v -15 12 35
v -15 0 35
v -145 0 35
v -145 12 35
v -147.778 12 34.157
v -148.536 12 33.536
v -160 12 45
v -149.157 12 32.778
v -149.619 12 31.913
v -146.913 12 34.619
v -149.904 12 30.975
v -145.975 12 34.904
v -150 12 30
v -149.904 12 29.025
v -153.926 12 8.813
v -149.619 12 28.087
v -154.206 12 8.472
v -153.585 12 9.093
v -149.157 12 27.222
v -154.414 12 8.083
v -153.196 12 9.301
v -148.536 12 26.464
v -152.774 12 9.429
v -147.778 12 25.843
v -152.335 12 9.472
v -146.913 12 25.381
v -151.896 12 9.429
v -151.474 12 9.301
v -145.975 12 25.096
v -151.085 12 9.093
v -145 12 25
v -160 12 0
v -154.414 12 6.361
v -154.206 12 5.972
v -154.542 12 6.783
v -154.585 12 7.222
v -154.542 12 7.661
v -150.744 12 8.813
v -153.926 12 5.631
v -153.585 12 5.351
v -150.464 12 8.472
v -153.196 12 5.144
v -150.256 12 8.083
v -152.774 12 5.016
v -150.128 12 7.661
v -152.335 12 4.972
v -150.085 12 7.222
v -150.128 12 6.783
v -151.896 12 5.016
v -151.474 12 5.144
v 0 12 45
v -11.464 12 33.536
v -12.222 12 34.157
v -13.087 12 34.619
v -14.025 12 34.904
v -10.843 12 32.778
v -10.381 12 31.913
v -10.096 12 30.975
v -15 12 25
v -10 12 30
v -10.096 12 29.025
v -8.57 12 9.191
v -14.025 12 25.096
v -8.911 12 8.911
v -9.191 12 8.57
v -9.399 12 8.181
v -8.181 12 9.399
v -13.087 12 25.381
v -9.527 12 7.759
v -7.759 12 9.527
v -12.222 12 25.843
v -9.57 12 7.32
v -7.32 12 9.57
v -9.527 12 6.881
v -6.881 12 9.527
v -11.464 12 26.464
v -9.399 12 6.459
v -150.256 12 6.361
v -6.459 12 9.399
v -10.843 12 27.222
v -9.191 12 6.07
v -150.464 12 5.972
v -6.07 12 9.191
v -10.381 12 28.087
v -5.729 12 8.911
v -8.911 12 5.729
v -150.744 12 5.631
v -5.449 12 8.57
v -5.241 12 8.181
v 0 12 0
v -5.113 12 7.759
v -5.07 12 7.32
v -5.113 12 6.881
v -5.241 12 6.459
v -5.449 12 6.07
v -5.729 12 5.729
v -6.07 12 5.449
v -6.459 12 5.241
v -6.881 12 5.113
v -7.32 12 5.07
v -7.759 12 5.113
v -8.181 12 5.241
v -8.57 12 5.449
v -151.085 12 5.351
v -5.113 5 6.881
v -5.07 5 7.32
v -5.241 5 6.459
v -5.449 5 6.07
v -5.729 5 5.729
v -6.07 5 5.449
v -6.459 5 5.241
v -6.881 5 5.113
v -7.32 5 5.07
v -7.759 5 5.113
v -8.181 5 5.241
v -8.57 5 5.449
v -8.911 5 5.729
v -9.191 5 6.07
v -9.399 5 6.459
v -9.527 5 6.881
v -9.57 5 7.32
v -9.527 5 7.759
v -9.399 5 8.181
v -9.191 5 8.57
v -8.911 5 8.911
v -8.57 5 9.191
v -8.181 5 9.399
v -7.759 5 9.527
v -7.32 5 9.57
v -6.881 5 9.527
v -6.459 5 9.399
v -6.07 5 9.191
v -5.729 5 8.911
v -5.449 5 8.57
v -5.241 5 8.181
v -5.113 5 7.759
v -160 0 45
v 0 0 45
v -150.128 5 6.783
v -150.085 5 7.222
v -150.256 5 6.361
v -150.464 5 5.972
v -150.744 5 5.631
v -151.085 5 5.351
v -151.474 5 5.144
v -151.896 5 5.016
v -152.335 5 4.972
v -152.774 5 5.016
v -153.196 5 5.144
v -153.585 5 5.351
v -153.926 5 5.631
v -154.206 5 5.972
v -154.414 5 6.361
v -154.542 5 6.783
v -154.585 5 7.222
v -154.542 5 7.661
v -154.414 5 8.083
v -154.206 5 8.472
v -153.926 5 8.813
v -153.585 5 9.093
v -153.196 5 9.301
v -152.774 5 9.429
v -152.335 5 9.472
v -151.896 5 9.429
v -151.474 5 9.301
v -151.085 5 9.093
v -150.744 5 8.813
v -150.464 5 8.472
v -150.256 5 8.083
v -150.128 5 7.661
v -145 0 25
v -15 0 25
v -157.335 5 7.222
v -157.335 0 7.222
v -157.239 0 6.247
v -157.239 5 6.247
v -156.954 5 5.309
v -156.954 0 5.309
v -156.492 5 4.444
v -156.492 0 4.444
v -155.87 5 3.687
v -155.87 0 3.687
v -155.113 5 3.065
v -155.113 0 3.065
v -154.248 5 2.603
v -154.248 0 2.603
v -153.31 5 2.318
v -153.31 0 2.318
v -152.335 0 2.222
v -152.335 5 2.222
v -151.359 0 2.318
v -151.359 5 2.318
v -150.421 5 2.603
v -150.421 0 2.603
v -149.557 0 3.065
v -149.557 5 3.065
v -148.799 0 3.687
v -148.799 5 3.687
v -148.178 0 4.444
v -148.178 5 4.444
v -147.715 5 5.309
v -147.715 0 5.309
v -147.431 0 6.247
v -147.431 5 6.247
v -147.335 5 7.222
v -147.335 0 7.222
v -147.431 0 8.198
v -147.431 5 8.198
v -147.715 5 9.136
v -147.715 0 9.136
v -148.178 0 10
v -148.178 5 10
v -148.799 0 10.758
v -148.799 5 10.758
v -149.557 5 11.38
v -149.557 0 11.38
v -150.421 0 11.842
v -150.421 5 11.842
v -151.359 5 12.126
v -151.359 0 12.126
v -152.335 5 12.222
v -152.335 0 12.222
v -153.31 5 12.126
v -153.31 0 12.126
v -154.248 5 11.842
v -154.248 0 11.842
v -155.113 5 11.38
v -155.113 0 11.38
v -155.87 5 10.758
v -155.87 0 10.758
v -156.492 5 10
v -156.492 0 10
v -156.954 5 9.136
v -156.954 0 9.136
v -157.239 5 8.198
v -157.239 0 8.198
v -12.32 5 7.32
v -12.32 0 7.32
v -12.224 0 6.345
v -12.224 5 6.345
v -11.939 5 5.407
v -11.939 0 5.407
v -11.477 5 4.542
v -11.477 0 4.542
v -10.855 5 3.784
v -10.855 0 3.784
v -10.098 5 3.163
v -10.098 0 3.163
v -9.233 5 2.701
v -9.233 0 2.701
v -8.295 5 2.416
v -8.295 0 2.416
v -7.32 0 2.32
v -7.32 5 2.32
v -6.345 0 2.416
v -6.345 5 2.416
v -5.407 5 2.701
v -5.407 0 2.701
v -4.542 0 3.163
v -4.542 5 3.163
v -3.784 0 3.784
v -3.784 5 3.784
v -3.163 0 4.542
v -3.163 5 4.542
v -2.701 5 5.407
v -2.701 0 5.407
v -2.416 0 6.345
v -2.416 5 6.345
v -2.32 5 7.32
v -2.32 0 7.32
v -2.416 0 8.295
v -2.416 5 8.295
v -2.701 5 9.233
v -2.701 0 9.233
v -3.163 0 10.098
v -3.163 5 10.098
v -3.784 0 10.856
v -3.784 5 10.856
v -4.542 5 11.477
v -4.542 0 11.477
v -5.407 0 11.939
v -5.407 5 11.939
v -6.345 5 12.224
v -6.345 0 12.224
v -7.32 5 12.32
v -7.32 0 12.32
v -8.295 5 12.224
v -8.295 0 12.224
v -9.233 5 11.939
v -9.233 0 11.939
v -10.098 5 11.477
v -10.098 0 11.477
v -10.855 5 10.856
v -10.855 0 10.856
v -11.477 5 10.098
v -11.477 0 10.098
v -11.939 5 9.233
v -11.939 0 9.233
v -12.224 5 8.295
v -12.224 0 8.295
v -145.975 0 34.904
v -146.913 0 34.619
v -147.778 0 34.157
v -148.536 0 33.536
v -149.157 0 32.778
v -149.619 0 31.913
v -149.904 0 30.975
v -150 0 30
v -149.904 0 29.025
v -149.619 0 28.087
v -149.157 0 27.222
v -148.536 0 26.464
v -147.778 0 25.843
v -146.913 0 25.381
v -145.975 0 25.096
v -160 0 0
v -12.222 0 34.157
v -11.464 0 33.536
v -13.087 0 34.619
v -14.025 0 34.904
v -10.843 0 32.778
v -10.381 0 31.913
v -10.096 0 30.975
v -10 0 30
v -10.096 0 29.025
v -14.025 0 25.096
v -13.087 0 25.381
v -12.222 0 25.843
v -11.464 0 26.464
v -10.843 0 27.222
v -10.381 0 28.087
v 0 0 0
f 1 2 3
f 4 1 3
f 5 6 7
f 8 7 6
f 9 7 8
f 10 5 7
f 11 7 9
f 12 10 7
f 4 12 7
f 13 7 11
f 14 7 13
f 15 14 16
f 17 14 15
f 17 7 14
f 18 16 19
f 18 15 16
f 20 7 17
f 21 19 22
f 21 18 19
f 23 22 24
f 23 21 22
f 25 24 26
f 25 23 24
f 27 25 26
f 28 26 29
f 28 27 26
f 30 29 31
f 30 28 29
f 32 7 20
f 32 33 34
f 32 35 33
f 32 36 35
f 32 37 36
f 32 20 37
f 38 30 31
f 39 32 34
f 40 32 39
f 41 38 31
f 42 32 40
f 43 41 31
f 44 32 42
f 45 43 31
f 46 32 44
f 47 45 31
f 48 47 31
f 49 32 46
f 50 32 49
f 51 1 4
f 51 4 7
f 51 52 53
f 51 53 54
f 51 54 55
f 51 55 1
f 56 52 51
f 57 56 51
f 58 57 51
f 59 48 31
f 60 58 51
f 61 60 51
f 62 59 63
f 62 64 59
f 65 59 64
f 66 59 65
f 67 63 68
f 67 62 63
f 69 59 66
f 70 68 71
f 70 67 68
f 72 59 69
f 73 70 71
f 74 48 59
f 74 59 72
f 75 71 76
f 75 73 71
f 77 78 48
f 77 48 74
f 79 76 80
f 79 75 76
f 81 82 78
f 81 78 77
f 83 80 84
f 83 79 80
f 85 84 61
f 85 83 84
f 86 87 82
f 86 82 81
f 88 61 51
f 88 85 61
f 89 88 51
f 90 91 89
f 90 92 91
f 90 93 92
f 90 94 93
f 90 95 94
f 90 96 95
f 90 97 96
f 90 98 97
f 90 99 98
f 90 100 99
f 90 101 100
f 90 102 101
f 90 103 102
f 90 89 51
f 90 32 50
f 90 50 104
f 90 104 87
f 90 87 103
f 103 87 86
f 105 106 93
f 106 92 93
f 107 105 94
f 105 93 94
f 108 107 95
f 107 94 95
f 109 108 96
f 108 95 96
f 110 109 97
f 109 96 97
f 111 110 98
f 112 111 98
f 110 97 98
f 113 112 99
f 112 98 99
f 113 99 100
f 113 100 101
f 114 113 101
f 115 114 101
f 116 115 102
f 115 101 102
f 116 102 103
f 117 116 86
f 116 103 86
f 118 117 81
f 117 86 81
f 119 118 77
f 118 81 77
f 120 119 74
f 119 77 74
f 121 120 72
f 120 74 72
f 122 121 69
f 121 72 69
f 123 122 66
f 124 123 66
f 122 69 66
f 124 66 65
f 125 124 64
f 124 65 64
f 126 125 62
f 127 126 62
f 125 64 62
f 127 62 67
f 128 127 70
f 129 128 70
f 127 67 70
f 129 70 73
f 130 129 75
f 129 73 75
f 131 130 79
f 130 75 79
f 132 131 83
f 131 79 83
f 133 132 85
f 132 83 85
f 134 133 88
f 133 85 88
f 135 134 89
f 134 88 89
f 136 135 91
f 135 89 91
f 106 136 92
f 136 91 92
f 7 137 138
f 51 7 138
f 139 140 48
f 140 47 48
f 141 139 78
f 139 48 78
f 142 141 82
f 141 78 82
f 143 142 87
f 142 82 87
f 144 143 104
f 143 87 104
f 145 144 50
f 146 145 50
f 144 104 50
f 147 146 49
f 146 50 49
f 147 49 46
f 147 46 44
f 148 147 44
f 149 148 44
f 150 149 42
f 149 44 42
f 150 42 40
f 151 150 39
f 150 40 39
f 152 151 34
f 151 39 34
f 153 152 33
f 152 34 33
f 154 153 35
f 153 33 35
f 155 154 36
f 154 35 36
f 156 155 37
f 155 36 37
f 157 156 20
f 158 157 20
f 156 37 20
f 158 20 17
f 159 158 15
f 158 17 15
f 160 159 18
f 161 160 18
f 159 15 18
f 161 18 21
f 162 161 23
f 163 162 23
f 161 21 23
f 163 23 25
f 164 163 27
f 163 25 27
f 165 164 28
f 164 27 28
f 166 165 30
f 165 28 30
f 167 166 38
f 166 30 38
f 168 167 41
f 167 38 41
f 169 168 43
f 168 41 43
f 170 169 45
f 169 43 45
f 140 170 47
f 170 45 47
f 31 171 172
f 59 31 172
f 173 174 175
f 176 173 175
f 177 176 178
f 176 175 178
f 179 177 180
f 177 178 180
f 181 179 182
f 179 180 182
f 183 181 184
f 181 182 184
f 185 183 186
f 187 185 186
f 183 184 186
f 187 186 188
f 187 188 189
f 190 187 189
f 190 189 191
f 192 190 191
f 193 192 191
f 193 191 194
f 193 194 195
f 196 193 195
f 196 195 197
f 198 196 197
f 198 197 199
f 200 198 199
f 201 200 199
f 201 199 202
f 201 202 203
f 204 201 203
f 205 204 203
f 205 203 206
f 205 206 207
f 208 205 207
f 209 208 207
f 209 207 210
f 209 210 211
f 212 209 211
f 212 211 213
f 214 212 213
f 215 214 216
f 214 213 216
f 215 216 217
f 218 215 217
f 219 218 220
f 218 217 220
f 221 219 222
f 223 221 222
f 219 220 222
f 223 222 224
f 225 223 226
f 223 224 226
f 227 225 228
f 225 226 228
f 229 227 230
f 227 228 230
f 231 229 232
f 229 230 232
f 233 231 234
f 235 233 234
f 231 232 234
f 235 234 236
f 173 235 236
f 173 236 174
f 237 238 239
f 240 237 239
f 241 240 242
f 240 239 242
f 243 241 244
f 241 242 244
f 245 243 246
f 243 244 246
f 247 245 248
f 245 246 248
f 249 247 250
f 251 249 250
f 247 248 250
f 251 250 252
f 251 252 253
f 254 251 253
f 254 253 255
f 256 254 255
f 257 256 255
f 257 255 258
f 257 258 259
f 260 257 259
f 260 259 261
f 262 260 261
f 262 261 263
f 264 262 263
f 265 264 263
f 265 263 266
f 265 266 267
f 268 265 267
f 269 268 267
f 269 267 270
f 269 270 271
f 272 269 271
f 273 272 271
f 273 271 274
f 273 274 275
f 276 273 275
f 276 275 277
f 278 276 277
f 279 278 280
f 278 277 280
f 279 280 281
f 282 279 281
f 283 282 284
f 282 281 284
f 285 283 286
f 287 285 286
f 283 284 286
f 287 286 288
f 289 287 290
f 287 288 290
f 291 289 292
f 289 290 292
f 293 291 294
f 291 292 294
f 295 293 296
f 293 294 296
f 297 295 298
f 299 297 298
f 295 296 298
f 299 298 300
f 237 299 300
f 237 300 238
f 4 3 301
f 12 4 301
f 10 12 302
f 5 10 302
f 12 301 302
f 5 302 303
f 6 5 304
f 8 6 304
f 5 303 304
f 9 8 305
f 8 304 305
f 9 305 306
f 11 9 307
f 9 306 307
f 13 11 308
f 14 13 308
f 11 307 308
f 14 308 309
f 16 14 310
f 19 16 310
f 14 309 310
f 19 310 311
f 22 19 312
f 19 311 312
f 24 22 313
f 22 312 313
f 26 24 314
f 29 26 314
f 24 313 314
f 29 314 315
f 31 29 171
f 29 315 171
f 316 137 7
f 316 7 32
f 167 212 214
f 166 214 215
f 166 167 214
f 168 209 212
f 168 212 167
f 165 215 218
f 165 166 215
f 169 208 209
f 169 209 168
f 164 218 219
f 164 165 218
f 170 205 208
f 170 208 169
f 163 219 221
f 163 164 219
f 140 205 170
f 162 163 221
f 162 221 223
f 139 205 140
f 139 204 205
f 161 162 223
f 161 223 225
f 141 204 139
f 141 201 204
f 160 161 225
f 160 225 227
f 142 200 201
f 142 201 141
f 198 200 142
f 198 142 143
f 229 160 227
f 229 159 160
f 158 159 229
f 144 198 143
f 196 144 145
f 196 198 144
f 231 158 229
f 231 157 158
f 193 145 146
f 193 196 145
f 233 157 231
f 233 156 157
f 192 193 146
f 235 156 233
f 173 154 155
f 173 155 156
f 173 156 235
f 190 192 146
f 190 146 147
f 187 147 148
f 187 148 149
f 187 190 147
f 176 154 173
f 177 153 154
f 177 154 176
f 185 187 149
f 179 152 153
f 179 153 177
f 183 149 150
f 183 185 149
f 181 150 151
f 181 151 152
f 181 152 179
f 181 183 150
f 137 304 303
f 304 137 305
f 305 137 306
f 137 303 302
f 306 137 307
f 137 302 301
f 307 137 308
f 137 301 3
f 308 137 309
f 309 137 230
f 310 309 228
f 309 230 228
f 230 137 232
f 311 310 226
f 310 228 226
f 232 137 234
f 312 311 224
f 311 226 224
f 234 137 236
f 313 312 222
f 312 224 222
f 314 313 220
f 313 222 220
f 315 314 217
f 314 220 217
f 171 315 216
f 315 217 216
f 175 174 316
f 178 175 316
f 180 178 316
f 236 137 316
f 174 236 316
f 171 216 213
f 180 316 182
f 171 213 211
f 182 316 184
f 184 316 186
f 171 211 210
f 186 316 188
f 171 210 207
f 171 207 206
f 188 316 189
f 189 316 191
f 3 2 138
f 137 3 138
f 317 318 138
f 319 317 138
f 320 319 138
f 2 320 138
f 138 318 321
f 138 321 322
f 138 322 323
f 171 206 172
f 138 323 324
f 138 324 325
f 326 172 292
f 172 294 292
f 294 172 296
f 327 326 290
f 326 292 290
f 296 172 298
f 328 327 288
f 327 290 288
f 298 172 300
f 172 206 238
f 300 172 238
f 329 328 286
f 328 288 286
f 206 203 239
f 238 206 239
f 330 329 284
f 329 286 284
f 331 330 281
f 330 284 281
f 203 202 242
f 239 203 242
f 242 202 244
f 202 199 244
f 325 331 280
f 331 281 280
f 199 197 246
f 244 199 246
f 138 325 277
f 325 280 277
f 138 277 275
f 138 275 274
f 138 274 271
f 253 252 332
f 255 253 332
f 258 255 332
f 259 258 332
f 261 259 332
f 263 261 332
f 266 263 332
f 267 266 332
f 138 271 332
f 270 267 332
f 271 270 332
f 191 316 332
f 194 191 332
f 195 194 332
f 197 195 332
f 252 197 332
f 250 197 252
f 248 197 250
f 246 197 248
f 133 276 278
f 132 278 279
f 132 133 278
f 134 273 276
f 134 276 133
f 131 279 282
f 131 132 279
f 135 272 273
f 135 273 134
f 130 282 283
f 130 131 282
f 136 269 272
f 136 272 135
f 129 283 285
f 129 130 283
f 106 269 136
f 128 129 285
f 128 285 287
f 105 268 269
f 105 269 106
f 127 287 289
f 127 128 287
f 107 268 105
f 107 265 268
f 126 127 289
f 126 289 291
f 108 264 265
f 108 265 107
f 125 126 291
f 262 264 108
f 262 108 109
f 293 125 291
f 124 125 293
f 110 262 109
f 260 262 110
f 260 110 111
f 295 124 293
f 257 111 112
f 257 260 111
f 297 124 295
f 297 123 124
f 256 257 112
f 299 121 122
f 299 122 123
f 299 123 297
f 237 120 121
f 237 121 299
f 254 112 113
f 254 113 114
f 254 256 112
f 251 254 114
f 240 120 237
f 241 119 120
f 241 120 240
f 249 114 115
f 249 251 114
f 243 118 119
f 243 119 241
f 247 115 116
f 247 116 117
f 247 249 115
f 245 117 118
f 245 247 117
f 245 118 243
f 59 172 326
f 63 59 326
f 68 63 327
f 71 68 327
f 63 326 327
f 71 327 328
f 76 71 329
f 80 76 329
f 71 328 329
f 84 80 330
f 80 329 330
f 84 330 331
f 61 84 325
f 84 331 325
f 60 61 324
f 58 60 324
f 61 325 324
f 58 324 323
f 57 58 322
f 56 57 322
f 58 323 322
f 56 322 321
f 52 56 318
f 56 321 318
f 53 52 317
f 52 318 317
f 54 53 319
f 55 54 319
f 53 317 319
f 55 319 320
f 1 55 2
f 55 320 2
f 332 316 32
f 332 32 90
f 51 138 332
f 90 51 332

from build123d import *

# Parameters (mm, degrees)
SKETCH1_W                               = 160
SKETCH1_H                               = 45
BOSS_EXTRUDE1_DEPTH                     = 12
CBORE_FOR_M5_HEX_HEAD_BOLT5_D           = 4.5
CBORE_FOR_M5_HEX_HEAD_BOLT5_CBORE_D     = 10
CBORE_FOR_M5_HEX_HEAD_BOLT5_CBORE_DEPTH = 5
CBORE_FOR_M5_HEX_HEAD_BOLT7_D           = 4.5
CBORE_FOR_M5_HEX_HEAD_BOLT7_CBORE_D     = 10
CBORE_FOR_M5_HEX_HEAD_BOLT7_CBORE_DEPTH = 5
CUT_EXTRUDE4_DEPTH                      = 12


with BuildPart() as part:
    # Sketch1 → Boss-Extrude1 (new body)
    with BuildSketch(Plane(origin=(0, 0, 0), x_dir=(1, 0, 0), z_dir=(0, 1, 0))):
        with Locations((-80, -22.5)):
            Rectangle(SKETCH1_W, SKETCH1_H)
    extrude(amount=BOSS_EXTRUDE1_DEPTH)

    # CBORE for M5 Hex Head Bolt5 (through all)
    with Locations(Plane(origin=(0, 0, 0), x_dir=(-1, 0, 0), z_dir=(0, -1, 0))):
        with Locations((152.334853244, -7.222273521)):
            CounterBoreHole(CBORE_FOR_M5_HEX_HEAD_BOLT5_D / 2, CBORE_FOR_M5_HEX_HEAD_BOLT5_CBORE_D / 2, CBORE_FOR_M5_HEX_HEAD_BOLT5_CBORE_DEPTH)

    # CBORE for M5 Hex Head Bolt7 (through all)
    with Locations(Plane(origin=(0, 0, 0), x_dir=(-1, 0, 0), z_dir=(0, -1, 0))):
        with Locations((7.319954145, -7.319990423)):
            CounterBoreHole(CBORE_FOR_M5_HEX_HEAD_BOLT7_D / 2, CBORE_FOR_M5_HEX_HEAD_BOLT7_CBORE_D / 2, CBORE_FOR_M5_HEX_HEAD_BOLT7_CBORE_DEPTH)

    # Sketch17 → Cut-Extrude4 (cut)
    with BuildSketch(Plane(origin=(0, 0, 0), x_dir=(-1, 0, 0), z_dir=(0, -1, 0))):
        with BuildLine():
            ThreePointArc((145, -35), (150, -30), (145, -25))
            Line((145, -25), (15, -25))
            ThreePointArc((15, -25), (10, -30), (15, -35))
            Line((15, -35), (145, -35))
        make_face()
    extrude(amount=-CUT_EXTRUDE4_DEPTH, mode=Mode.SUBTRACT)


solid = part.part
